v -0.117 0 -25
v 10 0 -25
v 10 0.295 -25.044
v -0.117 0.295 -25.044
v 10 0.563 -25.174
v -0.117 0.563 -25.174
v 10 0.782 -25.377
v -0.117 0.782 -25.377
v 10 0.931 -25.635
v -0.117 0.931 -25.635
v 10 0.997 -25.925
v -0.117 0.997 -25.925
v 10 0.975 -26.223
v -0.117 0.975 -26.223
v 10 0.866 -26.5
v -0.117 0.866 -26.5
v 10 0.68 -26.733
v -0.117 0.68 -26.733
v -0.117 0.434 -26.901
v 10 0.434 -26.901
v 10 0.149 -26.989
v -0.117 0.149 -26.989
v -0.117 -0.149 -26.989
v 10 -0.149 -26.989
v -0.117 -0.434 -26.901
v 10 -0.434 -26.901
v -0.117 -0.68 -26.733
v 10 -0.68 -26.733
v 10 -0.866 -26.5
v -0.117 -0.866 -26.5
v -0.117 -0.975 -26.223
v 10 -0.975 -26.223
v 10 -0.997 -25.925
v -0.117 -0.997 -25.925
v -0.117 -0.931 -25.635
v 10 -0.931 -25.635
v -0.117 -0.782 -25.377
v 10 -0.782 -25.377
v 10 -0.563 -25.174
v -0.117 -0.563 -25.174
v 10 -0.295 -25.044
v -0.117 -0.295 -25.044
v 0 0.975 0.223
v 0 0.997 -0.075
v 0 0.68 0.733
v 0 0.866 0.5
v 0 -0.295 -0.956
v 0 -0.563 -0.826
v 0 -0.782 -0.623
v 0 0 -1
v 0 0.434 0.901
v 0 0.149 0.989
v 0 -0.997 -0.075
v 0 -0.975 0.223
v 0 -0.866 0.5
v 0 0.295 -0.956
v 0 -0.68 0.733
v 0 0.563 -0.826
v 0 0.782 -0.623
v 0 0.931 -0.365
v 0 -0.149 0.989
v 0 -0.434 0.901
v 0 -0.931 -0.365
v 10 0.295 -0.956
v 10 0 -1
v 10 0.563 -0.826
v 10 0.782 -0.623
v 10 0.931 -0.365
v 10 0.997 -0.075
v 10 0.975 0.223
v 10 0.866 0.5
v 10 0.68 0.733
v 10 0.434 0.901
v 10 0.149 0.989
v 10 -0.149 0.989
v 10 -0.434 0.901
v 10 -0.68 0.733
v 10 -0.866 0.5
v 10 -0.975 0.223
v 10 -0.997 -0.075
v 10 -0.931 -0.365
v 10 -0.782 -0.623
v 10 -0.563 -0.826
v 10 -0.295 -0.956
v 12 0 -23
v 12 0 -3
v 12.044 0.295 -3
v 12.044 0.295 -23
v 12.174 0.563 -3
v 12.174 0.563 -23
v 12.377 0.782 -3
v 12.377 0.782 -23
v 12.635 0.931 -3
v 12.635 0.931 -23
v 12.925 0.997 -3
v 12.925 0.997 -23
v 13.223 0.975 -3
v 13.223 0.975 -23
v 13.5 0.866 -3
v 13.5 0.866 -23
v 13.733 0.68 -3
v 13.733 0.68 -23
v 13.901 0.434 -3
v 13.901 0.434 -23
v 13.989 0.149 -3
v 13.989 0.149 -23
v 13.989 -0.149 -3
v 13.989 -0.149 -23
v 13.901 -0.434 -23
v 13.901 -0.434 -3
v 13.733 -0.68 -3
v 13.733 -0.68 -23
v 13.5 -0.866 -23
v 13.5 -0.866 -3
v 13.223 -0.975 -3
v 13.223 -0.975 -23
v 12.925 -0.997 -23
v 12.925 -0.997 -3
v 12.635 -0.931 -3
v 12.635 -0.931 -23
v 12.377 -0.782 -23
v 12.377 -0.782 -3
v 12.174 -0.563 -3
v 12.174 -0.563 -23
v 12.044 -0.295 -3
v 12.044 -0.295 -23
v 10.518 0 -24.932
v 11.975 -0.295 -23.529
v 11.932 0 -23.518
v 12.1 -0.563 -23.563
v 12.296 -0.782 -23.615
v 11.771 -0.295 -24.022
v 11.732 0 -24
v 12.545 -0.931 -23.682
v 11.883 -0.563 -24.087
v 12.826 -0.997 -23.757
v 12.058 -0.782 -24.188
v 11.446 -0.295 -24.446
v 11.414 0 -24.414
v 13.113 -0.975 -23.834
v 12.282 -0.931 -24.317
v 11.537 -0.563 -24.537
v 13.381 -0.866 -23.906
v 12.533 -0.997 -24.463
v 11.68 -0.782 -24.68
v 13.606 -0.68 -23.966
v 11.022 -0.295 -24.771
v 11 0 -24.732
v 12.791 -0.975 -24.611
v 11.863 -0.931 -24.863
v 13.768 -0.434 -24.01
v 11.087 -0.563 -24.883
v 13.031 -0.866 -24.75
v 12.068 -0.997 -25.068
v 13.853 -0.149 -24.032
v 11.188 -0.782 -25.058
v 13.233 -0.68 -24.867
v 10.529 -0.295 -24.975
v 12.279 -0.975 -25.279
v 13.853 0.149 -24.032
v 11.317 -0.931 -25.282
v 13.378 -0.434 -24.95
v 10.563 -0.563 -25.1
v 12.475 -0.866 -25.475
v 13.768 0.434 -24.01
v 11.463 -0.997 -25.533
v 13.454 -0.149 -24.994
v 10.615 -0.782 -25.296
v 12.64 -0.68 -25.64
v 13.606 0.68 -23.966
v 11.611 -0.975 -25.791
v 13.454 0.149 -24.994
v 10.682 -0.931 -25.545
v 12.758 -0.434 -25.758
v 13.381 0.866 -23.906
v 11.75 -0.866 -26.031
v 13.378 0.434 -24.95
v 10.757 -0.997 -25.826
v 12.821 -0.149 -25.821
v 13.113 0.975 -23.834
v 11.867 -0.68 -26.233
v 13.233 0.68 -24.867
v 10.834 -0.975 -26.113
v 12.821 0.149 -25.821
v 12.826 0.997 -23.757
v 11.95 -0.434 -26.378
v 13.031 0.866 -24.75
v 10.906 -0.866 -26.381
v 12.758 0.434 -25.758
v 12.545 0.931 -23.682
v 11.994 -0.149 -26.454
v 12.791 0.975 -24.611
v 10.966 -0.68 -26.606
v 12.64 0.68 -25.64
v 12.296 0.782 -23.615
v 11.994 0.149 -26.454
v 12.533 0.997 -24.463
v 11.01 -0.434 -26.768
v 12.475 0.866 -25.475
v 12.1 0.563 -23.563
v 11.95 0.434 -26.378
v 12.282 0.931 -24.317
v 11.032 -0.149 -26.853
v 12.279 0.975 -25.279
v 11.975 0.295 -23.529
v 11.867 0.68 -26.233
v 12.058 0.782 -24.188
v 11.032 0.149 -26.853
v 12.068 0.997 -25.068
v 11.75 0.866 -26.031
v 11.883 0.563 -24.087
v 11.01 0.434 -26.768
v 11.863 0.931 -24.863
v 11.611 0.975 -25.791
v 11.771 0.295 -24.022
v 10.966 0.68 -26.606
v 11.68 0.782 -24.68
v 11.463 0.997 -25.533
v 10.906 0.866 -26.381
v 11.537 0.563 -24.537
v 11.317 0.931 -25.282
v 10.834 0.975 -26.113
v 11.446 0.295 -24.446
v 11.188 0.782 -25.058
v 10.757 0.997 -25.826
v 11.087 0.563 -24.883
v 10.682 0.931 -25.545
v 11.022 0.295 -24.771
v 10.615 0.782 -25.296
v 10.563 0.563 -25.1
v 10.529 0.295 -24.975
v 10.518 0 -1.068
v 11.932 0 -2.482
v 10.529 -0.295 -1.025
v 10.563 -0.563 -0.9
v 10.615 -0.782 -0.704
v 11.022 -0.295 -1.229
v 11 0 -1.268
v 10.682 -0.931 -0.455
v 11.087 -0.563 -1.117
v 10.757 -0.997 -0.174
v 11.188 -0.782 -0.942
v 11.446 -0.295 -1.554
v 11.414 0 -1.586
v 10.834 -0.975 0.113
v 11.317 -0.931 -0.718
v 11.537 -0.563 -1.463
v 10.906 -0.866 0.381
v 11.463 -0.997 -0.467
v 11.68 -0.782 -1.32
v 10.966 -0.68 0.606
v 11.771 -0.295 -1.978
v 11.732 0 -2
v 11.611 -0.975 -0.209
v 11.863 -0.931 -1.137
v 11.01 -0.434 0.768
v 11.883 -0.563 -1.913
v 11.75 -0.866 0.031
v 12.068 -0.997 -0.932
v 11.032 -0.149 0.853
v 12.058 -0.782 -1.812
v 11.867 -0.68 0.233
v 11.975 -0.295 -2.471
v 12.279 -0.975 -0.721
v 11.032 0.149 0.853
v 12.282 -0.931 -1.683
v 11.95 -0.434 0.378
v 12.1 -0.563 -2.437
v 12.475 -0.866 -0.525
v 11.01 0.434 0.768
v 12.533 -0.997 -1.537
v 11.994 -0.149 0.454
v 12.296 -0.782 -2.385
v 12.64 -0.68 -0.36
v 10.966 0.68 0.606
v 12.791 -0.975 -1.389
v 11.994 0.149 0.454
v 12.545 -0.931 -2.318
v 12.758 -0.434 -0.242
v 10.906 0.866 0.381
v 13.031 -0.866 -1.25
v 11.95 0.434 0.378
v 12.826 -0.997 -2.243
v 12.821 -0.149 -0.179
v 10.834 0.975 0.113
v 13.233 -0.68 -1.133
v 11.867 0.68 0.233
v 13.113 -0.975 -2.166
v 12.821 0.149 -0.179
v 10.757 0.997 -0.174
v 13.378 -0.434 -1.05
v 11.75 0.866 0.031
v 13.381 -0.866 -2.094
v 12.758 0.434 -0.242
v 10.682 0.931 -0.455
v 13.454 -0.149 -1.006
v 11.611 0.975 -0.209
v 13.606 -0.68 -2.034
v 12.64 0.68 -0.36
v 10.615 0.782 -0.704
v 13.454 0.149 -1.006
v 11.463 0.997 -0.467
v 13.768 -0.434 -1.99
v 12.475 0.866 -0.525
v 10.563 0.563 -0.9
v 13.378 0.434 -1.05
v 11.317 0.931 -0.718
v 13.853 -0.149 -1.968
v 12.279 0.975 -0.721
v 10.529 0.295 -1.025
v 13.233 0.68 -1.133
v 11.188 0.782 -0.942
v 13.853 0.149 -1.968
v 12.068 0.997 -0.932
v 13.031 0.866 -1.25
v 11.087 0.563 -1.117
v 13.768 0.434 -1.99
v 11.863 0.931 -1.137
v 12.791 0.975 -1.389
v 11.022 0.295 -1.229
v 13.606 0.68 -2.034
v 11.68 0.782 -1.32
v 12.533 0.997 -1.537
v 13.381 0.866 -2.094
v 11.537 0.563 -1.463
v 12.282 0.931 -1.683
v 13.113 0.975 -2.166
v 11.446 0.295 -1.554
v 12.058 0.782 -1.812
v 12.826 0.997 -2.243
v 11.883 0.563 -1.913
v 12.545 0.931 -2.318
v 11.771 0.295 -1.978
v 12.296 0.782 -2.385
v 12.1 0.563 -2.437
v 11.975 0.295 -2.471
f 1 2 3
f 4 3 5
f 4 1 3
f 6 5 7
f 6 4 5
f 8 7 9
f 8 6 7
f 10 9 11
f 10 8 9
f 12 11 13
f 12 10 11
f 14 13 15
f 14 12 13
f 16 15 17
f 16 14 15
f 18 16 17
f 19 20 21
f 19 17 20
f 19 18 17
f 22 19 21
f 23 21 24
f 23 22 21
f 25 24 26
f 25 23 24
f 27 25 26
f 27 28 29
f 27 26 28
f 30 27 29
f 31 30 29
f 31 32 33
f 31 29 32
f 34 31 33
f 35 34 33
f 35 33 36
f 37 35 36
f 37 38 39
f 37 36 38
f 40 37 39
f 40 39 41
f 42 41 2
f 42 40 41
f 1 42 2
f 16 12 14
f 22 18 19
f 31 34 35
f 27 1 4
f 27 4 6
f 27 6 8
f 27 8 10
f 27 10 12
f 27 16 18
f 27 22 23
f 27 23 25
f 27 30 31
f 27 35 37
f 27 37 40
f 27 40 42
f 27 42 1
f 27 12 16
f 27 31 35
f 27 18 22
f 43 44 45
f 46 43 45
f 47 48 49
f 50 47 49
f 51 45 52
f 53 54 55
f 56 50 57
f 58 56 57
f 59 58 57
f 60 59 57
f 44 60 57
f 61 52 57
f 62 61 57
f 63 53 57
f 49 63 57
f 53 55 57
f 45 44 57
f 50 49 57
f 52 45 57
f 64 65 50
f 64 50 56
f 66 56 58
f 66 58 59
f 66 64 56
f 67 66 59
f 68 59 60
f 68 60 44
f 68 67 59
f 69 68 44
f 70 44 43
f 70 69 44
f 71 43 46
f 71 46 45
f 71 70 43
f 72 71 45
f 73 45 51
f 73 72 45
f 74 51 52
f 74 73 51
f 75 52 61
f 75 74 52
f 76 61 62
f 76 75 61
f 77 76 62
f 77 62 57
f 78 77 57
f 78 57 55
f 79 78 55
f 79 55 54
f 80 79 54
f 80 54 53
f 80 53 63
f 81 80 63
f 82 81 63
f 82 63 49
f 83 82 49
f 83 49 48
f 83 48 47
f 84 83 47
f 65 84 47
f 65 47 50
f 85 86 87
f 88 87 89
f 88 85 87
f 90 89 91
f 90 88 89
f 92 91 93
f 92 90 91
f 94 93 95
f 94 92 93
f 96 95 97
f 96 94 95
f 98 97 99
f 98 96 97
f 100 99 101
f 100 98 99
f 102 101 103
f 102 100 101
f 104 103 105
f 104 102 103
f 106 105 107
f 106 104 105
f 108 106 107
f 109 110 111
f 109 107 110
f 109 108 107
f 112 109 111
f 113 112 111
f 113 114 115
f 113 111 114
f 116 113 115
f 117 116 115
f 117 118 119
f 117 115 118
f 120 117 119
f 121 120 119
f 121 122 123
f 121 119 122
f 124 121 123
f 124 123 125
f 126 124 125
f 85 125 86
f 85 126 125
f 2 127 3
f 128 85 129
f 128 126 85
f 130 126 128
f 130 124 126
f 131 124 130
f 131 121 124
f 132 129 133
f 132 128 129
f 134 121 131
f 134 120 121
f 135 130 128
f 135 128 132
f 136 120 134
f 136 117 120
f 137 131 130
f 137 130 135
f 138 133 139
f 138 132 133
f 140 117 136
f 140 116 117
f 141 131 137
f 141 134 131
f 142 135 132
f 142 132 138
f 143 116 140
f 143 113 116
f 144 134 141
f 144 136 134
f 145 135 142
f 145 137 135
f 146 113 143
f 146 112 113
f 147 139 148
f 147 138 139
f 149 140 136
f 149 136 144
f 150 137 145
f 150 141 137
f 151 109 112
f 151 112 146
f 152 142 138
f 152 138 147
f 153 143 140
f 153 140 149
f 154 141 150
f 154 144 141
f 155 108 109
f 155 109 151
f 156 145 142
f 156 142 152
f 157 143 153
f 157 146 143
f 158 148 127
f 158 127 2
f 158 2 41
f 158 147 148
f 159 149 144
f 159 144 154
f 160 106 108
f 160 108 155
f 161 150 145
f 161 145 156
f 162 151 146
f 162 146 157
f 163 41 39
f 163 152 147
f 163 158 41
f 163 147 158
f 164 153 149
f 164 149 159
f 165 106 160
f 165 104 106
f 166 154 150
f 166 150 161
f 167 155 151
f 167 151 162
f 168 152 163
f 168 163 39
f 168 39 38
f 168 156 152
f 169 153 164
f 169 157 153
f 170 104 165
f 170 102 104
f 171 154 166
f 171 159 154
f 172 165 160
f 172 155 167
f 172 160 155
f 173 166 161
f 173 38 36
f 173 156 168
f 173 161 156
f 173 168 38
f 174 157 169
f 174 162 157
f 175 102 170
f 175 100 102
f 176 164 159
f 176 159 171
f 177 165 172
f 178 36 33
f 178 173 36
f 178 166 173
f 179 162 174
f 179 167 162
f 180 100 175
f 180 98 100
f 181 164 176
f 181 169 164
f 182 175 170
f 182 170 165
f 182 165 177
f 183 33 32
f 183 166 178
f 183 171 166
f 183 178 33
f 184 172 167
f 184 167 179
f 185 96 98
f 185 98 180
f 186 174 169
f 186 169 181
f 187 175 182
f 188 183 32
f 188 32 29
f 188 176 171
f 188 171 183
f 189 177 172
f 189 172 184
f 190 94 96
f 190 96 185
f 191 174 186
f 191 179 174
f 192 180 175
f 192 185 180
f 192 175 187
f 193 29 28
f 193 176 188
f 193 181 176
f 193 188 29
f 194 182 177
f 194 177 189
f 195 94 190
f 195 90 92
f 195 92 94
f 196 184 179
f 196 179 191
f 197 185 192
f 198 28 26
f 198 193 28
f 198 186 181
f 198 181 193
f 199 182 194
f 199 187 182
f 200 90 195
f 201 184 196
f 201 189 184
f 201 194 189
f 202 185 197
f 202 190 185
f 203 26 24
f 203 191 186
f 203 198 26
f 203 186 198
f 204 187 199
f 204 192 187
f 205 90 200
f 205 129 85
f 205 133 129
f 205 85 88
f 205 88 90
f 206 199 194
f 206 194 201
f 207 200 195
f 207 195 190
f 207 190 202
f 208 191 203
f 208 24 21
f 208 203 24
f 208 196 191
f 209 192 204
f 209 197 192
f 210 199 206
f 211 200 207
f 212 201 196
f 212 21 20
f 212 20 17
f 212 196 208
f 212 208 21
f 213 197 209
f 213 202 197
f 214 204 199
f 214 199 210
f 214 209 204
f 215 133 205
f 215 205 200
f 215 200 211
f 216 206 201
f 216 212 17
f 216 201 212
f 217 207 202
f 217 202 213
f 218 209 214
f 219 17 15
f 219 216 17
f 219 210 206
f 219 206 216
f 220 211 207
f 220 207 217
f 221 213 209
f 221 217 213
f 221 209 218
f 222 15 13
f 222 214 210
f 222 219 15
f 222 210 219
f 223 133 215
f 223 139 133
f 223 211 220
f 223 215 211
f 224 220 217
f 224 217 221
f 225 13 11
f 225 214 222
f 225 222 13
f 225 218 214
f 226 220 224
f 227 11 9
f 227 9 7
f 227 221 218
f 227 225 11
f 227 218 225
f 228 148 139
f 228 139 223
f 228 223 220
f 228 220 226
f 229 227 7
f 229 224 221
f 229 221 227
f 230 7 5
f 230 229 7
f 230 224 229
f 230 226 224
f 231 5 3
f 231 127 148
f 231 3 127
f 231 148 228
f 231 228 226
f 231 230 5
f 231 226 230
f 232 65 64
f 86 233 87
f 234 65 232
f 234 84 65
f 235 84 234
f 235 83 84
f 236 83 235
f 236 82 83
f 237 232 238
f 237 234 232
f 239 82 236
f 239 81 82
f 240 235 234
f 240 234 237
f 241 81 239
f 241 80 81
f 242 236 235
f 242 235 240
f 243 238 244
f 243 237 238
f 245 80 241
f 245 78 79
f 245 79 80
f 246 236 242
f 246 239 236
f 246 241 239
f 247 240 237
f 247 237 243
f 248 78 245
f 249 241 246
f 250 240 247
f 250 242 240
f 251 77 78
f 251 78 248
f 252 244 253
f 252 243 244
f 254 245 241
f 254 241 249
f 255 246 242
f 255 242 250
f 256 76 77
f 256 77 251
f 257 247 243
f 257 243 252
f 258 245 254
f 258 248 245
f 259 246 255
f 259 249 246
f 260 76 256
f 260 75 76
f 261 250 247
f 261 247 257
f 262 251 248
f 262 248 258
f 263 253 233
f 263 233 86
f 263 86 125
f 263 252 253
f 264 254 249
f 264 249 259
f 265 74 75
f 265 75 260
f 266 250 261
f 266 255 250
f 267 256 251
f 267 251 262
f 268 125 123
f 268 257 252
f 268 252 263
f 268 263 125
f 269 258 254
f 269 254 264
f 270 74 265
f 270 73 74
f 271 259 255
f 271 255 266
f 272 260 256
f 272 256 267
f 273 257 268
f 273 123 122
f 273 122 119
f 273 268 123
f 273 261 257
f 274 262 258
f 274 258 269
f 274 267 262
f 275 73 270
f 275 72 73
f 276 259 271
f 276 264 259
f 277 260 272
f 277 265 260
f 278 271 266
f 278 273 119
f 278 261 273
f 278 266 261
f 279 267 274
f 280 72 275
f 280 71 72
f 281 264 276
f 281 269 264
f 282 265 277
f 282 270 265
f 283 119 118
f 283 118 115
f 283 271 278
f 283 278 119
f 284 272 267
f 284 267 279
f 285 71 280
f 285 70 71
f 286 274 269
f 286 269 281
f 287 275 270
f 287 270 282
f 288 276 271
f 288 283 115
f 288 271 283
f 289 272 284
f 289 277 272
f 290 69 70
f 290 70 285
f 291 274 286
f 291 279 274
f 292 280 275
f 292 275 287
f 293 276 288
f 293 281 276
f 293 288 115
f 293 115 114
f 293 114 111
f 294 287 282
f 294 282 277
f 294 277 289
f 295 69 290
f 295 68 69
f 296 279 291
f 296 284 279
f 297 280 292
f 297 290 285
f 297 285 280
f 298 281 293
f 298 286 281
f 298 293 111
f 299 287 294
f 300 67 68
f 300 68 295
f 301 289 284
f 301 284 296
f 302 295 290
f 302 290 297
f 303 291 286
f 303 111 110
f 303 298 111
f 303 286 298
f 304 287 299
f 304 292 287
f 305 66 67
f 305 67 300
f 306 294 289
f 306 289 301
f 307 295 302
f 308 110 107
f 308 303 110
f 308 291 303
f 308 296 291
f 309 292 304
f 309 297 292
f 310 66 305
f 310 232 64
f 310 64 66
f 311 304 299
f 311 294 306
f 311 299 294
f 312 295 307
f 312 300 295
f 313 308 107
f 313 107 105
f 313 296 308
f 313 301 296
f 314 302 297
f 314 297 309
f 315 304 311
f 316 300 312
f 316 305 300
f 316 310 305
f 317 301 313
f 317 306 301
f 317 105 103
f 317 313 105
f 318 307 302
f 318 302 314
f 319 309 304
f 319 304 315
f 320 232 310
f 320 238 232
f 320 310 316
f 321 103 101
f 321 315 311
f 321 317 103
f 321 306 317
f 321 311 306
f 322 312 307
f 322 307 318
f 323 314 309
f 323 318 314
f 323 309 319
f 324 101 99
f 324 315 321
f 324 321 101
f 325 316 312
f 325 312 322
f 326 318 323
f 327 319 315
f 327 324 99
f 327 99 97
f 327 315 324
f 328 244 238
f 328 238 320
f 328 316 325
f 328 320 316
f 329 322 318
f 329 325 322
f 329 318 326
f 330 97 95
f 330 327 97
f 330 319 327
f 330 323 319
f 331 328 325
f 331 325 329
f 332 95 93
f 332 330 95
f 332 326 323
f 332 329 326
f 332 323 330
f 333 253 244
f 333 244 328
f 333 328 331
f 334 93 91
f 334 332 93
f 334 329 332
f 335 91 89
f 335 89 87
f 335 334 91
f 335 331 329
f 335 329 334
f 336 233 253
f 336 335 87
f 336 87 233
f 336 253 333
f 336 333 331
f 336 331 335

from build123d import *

# Parameters (mm, degrees)
SKETCH_1_R = 1


with BuildPart() as part:
    # По траектории1: sweep along a curve in space
    with BuildLine() as sweep_1_path:
        Line((0, 0, 0), (10, 0, 0))
        ThreePointArc((10, 0, 0), (12.121320344, 0, -0.878679656), (13, 0, -3))
        Line((13, 0, -3), (13, 0, -23))
        ThreePointArc((13, 0, -23), (12.121320344, 0, -25.121320344), (10, 0, -26))
        Line((10, 0, -26), (-0.116555464, 0, -26))
    # Эскиз1 → По траектории1 (sweep)
    with BuildSketch(Plane(origin=(0, 0, 0), x_dir=(0, 0, -1), z_dir=(1, 0, 0))):
        Circle(SKETCH_1_R)
    sweep(path=sweep_1_path.line)


solid = part.part
